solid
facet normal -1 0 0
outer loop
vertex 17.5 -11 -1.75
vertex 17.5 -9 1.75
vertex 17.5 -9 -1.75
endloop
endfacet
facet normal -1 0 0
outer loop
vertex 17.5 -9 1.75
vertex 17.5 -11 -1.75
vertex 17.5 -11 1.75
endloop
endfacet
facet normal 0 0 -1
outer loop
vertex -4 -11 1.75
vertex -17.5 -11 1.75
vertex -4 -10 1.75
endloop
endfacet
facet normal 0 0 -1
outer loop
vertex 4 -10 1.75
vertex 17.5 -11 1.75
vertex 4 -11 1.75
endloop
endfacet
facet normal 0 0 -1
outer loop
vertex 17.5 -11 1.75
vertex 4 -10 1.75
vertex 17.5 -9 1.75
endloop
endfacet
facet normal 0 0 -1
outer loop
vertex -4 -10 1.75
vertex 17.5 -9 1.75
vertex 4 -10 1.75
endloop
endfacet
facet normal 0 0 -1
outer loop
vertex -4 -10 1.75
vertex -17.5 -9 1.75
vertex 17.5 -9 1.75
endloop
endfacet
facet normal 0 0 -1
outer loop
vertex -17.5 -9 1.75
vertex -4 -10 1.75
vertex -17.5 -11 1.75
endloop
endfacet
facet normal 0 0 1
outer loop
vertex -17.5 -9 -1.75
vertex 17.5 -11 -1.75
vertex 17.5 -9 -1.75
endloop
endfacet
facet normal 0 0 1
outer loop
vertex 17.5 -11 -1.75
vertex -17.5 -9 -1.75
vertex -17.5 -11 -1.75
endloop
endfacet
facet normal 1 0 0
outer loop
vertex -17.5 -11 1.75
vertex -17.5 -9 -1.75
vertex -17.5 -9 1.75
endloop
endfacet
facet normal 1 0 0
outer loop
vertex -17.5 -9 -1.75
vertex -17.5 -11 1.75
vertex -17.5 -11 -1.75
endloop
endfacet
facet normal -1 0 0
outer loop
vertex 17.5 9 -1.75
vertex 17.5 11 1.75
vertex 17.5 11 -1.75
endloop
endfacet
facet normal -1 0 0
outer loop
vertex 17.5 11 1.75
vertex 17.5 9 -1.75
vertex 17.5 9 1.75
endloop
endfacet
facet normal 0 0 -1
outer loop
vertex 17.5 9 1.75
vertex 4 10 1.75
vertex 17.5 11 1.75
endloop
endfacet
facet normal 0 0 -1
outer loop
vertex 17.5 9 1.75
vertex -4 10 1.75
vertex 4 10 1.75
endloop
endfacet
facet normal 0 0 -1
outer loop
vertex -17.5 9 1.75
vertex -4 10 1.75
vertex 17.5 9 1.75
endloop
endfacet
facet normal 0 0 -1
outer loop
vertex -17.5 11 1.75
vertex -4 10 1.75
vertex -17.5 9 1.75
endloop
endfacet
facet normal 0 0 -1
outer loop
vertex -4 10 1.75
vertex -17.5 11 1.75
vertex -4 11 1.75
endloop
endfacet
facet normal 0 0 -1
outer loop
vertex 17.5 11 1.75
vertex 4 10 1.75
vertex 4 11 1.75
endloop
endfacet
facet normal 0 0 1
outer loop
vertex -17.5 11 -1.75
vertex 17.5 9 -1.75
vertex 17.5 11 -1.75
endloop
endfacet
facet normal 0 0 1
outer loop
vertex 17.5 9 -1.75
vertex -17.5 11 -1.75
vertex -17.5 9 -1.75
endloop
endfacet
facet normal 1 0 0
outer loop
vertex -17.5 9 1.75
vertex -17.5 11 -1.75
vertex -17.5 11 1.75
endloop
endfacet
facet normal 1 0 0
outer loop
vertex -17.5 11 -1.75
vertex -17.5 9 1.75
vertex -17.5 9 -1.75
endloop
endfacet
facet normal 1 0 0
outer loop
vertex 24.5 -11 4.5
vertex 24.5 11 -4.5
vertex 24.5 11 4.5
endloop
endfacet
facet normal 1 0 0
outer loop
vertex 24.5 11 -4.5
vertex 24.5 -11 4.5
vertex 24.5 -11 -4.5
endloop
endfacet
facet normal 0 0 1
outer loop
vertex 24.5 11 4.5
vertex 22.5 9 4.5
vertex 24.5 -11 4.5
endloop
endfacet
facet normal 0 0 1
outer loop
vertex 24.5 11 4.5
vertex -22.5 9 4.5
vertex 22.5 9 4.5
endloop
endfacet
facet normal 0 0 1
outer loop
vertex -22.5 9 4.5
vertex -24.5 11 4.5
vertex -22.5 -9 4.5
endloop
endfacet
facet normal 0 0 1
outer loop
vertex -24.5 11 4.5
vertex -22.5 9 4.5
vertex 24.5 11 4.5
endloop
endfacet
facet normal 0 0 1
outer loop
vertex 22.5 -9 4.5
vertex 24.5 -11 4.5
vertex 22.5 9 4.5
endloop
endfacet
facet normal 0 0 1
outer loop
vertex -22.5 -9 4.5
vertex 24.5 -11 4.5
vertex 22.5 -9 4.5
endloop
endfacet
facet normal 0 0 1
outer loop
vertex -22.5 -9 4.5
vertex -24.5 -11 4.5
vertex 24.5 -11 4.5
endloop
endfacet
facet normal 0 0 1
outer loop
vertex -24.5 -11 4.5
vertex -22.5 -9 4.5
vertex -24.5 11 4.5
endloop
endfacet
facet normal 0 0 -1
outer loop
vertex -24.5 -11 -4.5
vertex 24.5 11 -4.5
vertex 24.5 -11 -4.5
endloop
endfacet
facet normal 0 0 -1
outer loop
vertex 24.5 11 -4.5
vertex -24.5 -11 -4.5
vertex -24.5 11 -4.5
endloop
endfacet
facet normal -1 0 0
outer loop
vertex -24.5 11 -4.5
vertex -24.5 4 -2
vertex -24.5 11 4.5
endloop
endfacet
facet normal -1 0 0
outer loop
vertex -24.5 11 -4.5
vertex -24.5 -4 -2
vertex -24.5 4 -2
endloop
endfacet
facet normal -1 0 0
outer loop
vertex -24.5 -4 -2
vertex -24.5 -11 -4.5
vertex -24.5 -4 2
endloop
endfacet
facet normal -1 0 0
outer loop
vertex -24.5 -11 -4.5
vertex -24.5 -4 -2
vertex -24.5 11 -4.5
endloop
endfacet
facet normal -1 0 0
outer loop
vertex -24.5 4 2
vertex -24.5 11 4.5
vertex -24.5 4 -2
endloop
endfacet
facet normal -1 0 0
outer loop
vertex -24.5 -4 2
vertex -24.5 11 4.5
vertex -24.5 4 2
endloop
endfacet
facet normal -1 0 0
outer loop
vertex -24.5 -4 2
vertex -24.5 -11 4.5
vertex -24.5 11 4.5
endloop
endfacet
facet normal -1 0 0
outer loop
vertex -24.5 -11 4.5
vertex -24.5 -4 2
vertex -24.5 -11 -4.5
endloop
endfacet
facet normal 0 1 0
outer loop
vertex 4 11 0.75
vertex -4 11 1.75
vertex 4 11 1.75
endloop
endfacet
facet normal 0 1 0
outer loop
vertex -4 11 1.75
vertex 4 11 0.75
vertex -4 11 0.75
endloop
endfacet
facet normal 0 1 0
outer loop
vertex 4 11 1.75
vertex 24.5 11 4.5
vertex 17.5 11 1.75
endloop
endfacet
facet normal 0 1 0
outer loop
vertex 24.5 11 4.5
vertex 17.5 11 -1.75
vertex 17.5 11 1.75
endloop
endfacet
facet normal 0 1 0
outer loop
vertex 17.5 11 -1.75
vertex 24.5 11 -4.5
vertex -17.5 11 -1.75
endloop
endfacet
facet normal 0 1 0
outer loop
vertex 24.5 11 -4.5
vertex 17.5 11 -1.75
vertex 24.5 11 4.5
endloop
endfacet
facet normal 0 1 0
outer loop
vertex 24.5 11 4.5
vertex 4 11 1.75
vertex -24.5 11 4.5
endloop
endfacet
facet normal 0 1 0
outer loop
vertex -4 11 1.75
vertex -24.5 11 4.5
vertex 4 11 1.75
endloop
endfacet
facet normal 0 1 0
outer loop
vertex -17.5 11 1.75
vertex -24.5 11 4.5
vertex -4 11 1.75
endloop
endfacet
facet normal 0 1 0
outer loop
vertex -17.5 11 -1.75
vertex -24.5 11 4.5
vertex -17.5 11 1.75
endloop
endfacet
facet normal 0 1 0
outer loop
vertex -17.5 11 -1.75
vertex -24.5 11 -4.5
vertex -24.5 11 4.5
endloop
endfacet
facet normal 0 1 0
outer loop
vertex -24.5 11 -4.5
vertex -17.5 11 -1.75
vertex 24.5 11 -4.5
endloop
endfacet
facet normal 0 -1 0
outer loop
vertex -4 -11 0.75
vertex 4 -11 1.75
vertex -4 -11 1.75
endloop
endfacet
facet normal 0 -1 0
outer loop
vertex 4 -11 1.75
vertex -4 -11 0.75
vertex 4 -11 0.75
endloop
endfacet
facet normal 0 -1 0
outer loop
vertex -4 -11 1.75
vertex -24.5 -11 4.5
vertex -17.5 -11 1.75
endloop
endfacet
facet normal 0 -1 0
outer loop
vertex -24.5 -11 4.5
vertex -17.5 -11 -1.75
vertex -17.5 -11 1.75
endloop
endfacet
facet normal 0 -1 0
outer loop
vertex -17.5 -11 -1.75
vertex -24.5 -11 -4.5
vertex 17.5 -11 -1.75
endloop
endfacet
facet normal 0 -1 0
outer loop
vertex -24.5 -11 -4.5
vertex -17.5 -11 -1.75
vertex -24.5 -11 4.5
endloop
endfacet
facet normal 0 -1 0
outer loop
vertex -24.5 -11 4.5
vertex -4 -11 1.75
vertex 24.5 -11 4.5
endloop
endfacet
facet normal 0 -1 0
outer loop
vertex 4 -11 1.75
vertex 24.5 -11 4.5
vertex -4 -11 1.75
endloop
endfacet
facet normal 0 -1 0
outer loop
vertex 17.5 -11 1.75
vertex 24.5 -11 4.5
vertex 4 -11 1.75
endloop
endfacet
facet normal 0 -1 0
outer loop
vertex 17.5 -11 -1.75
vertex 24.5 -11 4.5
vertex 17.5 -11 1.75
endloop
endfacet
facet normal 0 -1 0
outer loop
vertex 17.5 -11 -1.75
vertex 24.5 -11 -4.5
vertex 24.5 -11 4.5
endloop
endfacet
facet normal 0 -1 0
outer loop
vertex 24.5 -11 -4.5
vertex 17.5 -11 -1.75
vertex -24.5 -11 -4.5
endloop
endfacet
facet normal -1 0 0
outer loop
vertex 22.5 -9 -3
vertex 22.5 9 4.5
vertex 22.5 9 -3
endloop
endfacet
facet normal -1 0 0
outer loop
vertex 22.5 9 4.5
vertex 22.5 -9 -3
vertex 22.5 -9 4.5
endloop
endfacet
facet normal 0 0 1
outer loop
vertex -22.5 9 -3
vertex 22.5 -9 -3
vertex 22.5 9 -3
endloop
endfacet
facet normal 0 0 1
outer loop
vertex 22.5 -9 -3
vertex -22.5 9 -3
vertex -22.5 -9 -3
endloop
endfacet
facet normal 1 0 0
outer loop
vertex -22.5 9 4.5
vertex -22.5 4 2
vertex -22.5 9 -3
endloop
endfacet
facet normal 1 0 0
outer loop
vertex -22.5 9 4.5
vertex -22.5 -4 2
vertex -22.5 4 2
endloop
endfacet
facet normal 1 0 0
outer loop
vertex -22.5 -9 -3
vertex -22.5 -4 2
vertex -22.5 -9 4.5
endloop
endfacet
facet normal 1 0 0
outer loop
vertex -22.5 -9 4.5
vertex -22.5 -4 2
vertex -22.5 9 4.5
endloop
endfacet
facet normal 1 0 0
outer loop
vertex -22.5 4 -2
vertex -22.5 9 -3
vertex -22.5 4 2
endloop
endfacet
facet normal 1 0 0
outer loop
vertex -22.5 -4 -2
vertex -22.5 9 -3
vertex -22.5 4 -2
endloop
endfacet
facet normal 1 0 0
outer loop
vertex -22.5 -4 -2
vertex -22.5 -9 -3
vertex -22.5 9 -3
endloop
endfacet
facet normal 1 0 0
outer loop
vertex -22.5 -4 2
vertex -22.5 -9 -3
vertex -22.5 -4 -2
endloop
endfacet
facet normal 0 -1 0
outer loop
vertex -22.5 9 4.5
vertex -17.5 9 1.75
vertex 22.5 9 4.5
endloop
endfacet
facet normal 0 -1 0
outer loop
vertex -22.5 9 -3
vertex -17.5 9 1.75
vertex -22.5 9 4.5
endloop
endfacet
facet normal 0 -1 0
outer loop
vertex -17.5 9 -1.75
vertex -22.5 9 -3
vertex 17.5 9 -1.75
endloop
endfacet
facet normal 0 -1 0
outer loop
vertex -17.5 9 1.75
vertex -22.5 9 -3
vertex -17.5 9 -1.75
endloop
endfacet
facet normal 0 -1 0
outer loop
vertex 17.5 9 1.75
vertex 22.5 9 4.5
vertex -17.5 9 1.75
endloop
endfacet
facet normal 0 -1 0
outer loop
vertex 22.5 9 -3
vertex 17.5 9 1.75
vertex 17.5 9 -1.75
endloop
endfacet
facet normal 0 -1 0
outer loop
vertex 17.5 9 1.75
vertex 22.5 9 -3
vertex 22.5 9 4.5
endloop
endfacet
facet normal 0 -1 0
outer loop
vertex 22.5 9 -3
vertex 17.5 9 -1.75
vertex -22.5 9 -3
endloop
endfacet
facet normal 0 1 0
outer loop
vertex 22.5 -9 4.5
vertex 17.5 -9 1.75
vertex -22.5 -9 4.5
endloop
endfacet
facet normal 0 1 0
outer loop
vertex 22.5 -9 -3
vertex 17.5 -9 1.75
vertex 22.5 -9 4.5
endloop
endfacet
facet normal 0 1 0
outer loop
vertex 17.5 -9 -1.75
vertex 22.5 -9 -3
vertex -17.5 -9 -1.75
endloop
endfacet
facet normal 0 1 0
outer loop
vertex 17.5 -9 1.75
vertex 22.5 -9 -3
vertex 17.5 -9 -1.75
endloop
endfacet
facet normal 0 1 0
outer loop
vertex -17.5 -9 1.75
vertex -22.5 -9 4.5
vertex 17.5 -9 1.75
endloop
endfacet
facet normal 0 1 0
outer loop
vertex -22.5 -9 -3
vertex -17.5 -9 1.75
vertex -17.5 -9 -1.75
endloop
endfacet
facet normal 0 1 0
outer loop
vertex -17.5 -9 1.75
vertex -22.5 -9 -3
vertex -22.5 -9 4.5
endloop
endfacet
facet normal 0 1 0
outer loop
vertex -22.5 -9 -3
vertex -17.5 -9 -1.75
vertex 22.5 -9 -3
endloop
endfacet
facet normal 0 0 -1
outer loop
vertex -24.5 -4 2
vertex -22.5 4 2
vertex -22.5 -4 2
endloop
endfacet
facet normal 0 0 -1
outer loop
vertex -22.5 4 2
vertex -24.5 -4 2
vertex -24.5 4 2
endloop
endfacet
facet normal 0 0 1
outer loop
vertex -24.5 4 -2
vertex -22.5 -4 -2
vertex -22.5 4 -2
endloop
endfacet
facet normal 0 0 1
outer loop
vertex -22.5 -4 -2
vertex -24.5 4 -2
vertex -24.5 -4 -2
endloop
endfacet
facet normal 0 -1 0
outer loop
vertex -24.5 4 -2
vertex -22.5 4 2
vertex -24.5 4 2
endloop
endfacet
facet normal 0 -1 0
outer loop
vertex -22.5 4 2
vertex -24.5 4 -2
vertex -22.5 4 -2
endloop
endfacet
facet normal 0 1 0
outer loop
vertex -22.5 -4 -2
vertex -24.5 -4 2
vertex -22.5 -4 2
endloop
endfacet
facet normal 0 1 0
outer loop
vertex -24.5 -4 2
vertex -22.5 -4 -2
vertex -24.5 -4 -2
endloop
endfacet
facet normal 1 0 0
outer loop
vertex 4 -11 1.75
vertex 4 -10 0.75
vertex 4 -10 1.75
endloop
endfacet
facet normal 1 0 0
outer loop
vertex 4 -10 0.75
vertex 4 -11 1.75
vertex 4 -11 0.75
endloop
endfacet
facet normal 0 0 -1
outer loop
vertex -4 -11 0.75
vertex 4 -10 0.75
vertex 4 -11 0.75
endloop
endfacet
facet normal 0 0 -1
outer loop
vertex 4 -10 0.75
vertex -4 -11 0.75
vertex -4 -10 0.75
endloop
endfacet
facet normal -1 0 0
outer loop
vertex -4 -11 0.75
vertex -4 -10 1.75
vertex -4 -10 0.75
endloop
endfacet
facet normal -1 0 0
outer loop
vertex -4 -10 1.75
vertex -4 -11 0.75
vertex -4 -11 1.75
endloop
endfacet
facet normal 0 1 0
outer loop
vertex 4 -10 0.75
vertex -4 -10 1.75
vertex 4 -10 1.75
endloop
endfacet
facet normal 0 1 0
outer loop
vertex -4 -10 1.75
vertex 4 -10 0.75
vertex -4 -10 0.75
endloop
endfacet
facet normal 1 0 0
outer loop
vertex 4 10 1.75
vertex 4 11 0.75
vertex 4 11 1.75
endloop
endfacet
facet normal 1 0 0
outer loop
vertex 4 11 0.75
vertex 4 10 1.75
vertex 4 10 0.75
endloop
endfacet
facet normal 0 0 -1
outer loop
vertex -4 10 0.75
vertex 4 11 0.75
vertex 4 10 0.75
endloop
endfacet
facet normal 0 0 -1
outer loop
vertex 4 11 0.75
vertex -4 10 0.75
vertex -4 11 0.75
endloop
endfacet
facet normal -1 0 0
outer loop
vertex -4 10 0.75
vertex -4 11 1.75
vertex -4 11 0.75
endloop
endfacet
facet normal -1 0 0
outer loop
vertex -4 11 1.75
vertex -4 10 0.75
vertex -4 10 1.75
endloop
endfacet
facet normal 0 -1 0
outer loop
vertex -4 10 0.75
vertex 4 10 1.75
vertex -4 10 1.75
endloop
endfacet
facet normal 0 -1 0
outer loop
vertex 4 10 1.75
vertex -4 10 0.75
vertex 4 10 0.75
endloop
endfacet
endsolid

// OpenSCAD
// Arduino Nano Holder
// Nano: 45mm x 18mm x ~5mm
nano_length = 45;
nano_width = 18;
nano_height = 7;  // Including components
wall = 2;
usb_width = 8;
usb_height = 4;

difference() {
    // Outer shell
    cube([nano_length + wall*2, nano_width + wall*2, nano_height + wall], center=true);

    // Nano pocket
    translate([0, 0, wall/2])
        cube([nano_length, nano_width, nano_height + 1], center=true);

    // USB port cutout
    translate([-(nano_length/2 + wall/2), 0, 0])
        cube([wall*2, usb_width, usb_height], center=true);

    // Snap-fit slots
    for (y = [-1, 1]) {
        translate([0, y * (nano_width/2 + wall/2), 0])
            cube([nano_length - 10, wall+1, nano_height/2], center=true);
    }
}

// Snap clips
for (y = [-1, 1]) {
    translate([0, y * (nano_width/2 + wall - 0.5), nano_height/4])
        cube([8, 1, 2], center=true);
}
